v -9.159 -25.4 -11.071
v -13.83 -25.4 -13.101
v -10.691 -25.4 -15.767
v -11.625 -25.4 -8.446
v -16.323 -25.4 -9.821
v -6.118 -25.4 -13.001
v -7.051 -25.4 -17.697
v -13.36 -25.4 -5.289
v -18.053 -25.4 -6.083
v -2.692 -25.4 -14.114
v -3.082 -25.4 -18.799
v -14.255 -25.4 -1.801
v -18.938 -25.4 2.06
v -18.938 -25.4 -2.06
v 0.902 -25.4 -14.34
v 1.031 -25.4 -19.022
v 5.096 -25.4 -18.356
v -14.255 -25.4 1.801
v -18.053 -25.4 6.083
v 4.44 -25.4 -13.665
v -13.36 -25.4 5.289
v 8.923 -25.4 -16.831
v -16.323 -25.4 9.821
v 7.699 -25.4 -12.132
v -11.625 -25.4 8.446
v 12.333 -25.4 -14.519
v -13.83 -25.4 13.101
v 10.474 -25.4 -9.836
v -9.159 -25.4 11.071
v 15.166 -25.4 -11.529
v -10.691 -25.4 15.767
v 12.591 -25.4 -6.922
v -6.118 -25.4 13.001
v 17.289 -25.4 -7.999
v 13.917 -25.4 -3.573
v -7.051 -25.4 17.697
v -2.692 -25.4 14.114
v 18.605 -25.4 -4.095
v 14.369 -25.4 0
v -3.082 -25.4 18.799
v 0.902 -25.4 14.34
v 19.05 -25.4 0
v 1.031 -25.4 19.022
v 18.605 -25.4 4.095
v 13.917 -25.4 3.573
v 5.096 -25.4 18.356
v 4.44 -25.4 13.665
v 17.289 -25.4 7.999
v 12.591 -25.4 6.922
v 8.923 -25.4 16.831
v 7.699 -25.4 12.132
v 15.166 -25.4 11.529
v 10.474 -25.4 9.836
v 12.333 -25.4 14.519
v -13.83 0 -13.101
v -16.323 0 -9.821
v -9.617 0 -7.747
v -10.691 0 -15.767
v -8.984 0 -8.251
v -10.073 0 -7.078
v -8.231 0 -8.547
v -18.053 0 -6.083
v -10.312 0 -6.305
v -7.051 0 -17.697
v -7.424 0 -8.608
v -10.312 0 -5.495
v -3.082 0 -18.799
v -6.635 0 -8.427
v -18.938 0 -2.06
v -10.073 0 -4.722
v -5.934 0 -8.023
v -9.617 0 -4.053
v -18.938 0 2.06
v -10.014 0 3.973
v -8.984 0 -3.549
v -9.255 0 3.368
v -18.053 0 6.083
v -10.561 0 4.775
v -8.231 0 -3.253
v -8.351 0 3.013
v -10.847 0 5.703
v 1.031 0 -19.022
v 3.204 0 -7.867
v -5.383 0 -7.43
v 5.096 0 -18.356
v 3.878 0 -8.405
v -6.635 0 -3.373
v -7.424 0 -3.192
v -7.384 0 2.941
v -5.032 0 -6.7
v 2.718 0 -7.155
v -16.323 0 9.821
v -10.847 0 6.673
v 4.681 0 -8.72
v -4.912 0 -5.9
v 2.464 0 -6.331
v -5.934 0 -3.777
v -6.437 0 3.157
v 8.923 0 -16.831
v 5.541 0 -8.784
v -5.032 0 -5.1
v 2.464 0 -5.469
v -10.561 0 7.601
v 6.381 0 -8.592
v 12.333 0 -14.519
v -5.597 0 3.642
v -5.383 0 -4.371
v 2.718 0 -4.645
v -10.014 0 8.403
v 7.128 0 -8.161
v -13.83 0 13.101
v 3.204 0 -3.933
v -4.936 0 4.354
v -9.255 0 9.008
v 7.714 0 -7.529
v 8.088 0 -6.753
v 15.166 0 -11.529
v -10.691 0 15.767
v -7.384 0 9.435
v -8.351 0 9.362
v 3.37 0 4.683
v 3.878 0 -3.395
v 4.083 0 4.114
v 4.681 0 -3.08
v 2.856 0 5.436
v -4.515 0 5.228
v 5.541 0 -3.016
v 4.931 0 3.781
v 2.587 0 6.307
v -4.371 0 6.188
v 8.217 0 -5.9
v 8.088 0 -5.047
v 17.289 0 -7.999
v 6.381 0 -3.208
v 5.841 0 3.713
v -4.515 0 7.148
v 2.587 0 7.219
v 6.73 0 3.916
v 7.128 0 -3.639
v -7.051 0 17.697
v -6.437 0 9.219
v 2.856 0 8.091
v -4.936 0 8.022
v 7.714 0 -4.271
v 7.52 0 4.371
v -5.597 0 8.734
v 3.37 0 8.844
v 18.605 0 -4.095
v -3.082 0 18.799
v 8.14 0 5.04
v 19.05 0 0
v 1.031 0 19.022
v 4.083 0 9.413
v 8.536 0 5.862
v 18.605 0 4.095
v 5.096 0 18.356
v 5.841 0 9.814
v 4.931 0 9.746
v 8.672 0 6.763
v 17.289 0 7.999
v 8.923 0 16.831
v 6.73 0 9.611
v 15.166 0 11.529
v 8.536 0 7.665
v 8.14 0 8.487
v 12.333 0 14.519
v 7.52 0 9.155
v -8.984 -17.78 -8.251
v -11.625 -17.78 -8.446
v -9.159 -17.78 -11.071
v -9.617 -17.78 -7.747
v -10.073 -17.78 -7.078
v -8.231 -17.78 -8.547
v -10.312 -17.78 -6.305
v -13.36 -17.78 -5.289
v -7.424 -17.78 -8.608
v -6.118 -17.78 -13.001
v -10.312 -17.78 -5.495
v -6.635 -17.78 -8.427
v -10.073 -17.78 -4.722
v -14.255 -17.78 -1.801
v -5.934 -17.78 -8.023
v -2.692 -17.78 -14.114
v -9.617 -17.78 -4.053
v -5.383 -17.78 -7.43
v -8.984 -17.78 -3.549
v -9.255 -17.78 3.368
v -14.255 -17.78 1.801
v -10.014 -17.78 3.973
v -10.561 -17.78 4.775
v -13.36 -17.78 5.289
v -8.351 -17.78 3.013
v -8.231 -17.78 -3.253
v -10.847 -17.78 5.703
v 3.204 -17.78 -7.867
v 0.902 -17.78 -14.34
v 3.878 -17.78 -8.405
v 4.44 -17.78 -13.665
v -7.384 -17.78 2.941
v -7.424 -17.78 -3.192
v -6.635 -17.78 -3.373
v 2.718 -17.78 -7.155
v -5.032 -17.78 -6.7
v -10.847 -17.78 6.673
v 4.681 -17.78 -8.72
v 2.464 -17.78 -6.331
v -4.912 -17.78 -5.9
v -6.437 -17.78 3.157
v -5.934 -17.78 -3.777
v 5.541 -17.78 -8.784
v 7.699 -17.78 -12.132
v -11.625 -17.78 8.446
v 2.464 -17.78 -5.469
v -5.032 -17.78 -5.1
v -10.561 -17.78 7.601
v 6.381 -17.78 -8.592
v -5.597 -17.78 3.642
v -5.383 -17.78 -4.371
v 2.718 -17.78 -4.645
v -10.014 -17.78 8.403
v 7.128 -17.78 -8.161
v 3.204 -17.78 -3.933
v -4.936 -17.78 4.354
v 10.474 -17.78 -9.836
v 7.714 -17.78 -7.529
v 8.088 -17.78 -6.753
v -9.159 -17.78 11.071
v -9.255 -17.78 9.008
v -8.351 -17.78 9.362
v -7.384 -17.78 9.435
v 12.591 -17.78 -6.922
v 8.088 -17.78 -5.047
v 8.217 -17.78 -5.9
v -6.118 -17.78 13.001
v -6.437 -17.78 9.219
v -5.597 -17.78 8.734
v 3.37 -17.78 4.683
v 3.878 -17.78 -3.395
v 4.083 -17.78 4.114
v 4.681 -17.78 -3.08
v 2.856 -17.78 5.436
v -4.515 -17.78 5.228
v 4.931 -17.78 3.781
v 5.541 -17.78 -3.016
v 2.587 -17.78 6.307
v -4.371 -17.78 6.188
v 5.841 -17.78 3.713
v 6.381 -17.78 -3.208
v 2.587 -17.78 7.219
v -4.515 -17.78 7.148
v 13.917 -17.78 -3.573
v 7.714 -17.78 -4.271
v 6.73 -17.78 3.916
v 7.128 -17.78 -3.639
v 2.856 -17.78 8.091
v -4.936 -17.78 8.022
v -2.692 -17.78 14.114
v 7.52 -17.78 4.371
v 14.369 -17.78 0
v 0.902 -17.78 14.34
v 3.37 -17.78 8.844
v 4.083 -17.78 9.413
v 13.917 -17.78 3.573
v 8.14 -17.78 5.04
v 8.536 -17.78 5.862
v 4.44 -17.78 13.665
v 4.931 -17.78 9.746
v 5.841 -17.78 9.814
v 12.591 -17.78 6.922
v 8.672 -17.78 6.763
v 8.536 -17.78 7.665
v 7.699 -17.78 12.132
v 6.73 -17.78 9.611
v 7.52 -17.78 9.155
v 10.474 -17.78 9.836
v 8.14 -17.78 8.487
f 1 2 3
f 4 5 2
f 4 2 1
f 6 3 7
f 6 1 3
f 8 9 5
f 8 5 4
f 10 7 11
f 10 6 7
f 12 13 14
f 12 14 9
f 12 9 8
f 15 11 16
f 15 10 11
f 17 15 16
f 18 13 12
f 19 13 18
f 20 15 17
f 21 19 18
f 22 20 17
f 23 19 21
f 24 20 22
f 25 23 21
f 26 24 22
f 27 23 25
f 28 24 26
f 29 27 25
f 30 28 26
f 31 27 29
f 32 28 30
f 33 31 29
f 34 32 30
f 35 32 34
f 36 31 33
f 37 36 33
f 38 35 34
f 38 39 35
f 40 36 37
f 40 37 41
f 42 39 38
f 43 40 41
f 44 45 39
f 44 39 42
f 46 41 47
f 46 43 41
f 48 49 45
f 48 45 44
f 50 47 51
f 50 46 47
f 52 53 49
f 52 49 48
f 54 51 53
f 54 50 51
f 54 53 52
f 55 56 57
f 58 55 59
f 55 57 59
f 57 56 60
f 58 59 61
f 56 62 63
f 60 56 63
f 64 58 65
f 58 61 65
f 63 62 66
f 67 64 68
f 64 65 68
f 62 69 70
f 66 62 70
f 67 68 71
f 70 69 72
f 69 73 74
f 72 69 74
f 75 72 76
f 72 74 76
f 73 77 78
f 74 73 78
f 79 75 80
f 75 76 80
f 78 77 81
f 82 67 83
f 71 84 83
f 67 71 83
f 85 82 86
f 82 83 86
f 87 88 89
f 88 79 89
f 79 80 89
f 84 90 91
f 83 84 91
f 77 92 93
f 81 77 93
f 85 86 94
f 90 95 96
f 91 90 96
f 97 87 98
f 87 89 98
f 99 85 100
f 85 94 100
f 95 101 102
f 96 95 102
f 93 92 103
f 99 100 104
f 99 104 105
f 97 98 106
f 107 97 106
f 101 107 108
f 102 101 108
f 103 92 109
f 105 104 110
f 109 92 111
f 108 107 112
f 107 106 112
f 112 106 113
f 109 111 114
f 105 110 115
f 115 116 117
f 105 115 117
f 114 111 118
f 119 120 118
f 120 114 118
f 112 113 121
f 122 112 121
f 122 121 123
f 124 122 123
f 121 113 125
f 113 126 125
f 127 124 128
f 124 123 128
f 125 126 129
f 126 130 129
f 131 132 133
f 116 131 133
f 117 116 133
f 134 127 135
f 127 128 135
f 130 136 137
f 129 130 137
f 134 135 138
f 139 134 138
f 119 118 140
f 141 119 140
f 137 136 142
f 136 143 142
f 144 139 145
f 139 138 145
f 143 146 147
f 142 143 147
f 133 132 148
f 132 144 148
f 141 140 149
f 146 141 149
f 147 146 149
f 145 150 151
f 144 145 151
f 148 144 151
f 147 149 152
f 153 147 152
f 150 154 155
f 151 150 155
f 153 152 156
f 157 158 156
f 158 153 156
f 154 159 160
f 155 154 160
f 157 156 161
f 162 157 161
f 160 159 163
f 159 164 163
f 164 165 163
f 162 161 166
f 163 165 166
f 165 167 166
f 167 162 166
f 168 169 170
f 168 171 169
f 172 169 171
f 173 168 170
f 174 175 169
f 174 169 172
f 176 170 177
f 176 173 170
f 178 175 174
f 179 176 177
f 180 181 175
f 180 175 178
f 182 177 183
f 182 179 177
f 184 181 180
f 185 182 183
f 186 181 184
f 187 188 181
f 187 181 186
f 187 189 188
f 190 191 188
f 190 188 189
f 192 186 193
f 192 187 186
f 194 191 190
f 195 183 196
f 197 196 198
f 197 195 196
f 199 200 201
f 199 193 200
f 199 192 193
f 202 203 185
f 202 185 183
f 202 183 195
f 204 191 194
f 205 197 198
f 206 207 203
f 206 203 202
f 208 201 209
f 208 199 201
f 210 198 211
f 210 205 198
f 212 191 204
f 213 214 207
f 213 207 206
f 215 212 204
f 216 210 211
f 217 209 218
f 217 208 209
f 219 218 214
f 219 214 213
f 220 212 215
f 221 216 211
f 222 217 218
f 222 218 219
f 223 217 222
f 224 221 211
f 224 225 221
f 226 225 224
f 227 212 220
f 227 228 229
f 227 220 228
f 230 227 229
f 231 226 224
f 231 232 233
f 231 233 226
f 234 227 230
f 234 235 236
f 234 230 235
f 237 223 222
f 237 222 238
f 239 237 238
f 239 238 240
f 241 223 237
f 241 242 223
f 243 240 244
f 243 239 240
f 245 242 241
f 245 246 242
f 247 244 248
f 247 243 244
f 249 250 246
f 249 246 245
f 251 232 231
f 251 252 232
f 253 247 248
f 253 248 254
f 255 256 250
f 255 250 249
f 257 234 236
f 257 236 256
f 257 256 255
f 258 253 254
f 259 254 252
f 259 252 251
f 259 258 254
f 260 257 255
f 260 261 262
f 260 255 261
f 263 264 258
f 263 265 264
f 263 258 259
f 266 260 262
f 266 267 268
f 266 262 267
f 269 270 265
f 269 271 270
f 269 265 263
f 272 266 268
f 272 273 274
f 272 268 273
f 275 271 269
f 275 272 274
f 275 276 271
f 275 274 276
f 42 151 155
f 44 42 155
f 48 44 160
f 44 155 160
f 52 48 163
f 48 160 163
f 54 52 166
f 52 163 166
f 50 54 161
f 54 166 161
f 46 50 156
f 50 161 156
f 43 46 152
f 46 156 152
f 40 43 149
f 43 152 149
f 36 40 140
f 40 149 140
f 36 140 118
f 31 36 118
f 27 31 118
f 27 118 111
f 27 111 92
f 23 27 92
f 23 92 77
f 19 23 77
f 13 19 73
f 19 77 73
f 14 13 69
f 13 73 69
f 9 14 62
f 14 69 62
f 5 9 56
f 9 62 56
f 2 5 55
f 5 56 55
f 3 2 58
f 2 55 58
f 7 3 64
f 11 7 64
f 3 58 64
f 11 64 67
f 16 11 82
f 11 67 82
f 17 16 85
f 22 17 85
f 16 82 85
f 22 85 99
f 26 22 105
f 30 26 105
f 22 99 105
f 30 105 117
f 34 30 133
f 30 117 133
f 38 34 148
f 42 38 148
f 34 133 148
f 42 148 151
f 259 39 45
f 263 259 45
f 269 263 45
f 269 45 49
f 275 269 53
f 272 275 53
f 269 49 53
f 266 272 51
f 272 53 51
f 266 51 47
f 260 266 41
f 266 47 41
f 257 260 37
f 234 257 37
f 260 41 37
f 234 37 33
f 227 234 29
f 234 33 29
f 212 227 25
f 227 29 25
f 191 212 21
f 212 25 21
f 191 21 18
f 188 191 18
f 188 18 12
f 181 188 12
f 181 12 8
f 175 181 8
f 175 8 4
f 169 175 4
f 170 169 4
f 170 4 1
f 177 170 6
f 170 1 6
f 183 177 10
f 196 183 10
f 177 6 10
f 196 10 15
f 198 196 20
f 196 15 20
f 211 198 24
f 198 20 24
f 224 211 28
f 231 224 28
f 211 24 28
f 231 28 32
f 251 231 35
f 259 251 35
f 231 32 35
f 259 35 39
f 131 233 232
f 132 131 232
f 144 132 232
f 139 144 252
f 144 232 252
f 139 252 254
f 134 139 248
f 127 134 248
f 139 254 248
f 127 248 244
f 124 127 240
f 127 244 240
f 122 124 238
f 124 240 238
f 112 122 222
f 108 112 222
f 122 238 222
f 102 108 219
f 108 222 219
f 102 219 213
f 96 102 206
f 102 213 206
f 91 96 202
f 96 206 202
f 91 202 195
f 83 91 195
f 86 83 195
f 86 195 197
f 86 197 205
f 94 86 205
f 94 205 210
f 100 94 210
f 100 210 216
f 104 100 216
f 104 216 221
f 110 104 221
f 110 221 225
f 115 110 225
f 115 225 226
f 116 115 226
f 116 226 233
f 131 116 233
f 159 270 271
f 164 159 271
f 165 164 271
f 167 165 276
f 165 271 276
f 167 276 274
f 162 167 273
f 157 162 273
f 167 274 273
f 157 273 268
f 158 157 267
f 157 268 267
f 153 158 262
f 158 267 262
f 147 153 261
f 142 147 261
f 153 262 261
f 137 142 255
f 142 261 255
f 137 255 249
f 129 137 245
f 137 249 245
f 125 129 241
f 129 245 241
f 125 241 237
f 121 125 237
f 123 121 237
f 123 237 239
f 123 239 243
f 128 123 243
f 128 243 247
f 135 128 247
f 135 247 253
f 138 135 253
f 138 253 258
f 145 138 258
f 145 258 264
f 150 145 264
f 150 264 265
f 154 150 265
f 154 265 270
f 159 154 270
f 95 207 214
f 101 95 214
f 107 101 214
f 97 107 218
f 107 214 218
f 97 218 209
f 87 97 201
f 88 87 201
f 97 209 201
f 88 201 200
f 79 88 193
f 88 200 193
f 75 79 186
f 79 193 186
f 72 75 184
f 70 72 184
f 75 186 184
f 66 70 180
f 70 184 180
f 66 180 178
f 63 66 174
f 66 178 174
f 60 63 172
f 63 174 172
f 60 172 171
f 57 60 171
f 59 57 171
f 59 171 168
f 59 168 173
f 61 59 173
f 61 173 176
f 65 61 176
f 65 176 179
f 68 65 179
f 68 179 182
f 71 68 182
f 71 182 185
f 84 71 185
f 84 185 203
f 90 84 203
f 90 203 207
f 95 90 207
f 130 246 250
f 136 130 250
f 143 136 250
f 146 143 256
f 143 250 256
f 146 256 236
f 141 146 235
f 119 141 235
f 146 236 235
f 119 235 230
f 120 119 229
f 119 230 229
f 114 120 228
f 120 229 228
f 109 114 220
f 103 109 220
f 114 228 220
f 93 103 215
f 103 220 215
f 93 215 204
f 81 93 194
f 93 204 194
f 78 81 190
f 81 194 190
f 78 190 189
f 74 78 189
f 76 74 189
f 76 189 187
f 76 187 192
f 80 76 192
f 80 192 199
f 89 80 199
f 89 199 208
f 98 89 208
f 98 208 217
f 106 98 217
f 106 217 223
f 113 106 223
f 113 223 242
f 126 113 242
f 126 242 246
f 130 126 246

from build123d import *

# Parameters (mm, degrees)
F0_R     = 19.05
F0_R_2   = 14.351381
F1_DEPTH = 25.4
F2_R     = 14.368686
F3_DEPTH = 7.62
F4_R     = 2.715155
F4_R_2   = 3.256151
F4_R_3   = 3.059417
F4_R_4   = 2.892412
F5_DEPTH = 17.781


with BuildPart() as f1:
    # F0 (on Front) → F1 (new body)
    with BuildSketch(Plane.XZ):
        Circle(F0_R)
        Circle(F0_R_2, mode=Mode.SUBTRACT)
        Circle(F0_R_2)
    extrude(amount=F1_DEPTH)

    # F2 (on face) → F3 (cut)
    with BuildSketch(Plane.XZ.offset(25.4)):
        Circle(F2_R)
    extrude(amount=-F3_DEPTH, mode=Mode.SUBTRACT)

    # F4 (on face) → F5 (cut, through all)
    with BuildSketch(Plane.XZ.offset(17.78)):
        with Locations((-7.626853, -5.900018)):
            Circle(F4_R)
        with Locations((-7.626853, 6.187824)):
            Circle(F4_R_2)
        with Locations((5.612213, 6.763435)):
            Circle(F4_R_3)
        with Locations((5.324407, -5.900018)):
            Circle(F4_R_4)
    extrude(amount=-F5_DEPTH, mode=Mode.SUBTRACT)


solid = f1.part
